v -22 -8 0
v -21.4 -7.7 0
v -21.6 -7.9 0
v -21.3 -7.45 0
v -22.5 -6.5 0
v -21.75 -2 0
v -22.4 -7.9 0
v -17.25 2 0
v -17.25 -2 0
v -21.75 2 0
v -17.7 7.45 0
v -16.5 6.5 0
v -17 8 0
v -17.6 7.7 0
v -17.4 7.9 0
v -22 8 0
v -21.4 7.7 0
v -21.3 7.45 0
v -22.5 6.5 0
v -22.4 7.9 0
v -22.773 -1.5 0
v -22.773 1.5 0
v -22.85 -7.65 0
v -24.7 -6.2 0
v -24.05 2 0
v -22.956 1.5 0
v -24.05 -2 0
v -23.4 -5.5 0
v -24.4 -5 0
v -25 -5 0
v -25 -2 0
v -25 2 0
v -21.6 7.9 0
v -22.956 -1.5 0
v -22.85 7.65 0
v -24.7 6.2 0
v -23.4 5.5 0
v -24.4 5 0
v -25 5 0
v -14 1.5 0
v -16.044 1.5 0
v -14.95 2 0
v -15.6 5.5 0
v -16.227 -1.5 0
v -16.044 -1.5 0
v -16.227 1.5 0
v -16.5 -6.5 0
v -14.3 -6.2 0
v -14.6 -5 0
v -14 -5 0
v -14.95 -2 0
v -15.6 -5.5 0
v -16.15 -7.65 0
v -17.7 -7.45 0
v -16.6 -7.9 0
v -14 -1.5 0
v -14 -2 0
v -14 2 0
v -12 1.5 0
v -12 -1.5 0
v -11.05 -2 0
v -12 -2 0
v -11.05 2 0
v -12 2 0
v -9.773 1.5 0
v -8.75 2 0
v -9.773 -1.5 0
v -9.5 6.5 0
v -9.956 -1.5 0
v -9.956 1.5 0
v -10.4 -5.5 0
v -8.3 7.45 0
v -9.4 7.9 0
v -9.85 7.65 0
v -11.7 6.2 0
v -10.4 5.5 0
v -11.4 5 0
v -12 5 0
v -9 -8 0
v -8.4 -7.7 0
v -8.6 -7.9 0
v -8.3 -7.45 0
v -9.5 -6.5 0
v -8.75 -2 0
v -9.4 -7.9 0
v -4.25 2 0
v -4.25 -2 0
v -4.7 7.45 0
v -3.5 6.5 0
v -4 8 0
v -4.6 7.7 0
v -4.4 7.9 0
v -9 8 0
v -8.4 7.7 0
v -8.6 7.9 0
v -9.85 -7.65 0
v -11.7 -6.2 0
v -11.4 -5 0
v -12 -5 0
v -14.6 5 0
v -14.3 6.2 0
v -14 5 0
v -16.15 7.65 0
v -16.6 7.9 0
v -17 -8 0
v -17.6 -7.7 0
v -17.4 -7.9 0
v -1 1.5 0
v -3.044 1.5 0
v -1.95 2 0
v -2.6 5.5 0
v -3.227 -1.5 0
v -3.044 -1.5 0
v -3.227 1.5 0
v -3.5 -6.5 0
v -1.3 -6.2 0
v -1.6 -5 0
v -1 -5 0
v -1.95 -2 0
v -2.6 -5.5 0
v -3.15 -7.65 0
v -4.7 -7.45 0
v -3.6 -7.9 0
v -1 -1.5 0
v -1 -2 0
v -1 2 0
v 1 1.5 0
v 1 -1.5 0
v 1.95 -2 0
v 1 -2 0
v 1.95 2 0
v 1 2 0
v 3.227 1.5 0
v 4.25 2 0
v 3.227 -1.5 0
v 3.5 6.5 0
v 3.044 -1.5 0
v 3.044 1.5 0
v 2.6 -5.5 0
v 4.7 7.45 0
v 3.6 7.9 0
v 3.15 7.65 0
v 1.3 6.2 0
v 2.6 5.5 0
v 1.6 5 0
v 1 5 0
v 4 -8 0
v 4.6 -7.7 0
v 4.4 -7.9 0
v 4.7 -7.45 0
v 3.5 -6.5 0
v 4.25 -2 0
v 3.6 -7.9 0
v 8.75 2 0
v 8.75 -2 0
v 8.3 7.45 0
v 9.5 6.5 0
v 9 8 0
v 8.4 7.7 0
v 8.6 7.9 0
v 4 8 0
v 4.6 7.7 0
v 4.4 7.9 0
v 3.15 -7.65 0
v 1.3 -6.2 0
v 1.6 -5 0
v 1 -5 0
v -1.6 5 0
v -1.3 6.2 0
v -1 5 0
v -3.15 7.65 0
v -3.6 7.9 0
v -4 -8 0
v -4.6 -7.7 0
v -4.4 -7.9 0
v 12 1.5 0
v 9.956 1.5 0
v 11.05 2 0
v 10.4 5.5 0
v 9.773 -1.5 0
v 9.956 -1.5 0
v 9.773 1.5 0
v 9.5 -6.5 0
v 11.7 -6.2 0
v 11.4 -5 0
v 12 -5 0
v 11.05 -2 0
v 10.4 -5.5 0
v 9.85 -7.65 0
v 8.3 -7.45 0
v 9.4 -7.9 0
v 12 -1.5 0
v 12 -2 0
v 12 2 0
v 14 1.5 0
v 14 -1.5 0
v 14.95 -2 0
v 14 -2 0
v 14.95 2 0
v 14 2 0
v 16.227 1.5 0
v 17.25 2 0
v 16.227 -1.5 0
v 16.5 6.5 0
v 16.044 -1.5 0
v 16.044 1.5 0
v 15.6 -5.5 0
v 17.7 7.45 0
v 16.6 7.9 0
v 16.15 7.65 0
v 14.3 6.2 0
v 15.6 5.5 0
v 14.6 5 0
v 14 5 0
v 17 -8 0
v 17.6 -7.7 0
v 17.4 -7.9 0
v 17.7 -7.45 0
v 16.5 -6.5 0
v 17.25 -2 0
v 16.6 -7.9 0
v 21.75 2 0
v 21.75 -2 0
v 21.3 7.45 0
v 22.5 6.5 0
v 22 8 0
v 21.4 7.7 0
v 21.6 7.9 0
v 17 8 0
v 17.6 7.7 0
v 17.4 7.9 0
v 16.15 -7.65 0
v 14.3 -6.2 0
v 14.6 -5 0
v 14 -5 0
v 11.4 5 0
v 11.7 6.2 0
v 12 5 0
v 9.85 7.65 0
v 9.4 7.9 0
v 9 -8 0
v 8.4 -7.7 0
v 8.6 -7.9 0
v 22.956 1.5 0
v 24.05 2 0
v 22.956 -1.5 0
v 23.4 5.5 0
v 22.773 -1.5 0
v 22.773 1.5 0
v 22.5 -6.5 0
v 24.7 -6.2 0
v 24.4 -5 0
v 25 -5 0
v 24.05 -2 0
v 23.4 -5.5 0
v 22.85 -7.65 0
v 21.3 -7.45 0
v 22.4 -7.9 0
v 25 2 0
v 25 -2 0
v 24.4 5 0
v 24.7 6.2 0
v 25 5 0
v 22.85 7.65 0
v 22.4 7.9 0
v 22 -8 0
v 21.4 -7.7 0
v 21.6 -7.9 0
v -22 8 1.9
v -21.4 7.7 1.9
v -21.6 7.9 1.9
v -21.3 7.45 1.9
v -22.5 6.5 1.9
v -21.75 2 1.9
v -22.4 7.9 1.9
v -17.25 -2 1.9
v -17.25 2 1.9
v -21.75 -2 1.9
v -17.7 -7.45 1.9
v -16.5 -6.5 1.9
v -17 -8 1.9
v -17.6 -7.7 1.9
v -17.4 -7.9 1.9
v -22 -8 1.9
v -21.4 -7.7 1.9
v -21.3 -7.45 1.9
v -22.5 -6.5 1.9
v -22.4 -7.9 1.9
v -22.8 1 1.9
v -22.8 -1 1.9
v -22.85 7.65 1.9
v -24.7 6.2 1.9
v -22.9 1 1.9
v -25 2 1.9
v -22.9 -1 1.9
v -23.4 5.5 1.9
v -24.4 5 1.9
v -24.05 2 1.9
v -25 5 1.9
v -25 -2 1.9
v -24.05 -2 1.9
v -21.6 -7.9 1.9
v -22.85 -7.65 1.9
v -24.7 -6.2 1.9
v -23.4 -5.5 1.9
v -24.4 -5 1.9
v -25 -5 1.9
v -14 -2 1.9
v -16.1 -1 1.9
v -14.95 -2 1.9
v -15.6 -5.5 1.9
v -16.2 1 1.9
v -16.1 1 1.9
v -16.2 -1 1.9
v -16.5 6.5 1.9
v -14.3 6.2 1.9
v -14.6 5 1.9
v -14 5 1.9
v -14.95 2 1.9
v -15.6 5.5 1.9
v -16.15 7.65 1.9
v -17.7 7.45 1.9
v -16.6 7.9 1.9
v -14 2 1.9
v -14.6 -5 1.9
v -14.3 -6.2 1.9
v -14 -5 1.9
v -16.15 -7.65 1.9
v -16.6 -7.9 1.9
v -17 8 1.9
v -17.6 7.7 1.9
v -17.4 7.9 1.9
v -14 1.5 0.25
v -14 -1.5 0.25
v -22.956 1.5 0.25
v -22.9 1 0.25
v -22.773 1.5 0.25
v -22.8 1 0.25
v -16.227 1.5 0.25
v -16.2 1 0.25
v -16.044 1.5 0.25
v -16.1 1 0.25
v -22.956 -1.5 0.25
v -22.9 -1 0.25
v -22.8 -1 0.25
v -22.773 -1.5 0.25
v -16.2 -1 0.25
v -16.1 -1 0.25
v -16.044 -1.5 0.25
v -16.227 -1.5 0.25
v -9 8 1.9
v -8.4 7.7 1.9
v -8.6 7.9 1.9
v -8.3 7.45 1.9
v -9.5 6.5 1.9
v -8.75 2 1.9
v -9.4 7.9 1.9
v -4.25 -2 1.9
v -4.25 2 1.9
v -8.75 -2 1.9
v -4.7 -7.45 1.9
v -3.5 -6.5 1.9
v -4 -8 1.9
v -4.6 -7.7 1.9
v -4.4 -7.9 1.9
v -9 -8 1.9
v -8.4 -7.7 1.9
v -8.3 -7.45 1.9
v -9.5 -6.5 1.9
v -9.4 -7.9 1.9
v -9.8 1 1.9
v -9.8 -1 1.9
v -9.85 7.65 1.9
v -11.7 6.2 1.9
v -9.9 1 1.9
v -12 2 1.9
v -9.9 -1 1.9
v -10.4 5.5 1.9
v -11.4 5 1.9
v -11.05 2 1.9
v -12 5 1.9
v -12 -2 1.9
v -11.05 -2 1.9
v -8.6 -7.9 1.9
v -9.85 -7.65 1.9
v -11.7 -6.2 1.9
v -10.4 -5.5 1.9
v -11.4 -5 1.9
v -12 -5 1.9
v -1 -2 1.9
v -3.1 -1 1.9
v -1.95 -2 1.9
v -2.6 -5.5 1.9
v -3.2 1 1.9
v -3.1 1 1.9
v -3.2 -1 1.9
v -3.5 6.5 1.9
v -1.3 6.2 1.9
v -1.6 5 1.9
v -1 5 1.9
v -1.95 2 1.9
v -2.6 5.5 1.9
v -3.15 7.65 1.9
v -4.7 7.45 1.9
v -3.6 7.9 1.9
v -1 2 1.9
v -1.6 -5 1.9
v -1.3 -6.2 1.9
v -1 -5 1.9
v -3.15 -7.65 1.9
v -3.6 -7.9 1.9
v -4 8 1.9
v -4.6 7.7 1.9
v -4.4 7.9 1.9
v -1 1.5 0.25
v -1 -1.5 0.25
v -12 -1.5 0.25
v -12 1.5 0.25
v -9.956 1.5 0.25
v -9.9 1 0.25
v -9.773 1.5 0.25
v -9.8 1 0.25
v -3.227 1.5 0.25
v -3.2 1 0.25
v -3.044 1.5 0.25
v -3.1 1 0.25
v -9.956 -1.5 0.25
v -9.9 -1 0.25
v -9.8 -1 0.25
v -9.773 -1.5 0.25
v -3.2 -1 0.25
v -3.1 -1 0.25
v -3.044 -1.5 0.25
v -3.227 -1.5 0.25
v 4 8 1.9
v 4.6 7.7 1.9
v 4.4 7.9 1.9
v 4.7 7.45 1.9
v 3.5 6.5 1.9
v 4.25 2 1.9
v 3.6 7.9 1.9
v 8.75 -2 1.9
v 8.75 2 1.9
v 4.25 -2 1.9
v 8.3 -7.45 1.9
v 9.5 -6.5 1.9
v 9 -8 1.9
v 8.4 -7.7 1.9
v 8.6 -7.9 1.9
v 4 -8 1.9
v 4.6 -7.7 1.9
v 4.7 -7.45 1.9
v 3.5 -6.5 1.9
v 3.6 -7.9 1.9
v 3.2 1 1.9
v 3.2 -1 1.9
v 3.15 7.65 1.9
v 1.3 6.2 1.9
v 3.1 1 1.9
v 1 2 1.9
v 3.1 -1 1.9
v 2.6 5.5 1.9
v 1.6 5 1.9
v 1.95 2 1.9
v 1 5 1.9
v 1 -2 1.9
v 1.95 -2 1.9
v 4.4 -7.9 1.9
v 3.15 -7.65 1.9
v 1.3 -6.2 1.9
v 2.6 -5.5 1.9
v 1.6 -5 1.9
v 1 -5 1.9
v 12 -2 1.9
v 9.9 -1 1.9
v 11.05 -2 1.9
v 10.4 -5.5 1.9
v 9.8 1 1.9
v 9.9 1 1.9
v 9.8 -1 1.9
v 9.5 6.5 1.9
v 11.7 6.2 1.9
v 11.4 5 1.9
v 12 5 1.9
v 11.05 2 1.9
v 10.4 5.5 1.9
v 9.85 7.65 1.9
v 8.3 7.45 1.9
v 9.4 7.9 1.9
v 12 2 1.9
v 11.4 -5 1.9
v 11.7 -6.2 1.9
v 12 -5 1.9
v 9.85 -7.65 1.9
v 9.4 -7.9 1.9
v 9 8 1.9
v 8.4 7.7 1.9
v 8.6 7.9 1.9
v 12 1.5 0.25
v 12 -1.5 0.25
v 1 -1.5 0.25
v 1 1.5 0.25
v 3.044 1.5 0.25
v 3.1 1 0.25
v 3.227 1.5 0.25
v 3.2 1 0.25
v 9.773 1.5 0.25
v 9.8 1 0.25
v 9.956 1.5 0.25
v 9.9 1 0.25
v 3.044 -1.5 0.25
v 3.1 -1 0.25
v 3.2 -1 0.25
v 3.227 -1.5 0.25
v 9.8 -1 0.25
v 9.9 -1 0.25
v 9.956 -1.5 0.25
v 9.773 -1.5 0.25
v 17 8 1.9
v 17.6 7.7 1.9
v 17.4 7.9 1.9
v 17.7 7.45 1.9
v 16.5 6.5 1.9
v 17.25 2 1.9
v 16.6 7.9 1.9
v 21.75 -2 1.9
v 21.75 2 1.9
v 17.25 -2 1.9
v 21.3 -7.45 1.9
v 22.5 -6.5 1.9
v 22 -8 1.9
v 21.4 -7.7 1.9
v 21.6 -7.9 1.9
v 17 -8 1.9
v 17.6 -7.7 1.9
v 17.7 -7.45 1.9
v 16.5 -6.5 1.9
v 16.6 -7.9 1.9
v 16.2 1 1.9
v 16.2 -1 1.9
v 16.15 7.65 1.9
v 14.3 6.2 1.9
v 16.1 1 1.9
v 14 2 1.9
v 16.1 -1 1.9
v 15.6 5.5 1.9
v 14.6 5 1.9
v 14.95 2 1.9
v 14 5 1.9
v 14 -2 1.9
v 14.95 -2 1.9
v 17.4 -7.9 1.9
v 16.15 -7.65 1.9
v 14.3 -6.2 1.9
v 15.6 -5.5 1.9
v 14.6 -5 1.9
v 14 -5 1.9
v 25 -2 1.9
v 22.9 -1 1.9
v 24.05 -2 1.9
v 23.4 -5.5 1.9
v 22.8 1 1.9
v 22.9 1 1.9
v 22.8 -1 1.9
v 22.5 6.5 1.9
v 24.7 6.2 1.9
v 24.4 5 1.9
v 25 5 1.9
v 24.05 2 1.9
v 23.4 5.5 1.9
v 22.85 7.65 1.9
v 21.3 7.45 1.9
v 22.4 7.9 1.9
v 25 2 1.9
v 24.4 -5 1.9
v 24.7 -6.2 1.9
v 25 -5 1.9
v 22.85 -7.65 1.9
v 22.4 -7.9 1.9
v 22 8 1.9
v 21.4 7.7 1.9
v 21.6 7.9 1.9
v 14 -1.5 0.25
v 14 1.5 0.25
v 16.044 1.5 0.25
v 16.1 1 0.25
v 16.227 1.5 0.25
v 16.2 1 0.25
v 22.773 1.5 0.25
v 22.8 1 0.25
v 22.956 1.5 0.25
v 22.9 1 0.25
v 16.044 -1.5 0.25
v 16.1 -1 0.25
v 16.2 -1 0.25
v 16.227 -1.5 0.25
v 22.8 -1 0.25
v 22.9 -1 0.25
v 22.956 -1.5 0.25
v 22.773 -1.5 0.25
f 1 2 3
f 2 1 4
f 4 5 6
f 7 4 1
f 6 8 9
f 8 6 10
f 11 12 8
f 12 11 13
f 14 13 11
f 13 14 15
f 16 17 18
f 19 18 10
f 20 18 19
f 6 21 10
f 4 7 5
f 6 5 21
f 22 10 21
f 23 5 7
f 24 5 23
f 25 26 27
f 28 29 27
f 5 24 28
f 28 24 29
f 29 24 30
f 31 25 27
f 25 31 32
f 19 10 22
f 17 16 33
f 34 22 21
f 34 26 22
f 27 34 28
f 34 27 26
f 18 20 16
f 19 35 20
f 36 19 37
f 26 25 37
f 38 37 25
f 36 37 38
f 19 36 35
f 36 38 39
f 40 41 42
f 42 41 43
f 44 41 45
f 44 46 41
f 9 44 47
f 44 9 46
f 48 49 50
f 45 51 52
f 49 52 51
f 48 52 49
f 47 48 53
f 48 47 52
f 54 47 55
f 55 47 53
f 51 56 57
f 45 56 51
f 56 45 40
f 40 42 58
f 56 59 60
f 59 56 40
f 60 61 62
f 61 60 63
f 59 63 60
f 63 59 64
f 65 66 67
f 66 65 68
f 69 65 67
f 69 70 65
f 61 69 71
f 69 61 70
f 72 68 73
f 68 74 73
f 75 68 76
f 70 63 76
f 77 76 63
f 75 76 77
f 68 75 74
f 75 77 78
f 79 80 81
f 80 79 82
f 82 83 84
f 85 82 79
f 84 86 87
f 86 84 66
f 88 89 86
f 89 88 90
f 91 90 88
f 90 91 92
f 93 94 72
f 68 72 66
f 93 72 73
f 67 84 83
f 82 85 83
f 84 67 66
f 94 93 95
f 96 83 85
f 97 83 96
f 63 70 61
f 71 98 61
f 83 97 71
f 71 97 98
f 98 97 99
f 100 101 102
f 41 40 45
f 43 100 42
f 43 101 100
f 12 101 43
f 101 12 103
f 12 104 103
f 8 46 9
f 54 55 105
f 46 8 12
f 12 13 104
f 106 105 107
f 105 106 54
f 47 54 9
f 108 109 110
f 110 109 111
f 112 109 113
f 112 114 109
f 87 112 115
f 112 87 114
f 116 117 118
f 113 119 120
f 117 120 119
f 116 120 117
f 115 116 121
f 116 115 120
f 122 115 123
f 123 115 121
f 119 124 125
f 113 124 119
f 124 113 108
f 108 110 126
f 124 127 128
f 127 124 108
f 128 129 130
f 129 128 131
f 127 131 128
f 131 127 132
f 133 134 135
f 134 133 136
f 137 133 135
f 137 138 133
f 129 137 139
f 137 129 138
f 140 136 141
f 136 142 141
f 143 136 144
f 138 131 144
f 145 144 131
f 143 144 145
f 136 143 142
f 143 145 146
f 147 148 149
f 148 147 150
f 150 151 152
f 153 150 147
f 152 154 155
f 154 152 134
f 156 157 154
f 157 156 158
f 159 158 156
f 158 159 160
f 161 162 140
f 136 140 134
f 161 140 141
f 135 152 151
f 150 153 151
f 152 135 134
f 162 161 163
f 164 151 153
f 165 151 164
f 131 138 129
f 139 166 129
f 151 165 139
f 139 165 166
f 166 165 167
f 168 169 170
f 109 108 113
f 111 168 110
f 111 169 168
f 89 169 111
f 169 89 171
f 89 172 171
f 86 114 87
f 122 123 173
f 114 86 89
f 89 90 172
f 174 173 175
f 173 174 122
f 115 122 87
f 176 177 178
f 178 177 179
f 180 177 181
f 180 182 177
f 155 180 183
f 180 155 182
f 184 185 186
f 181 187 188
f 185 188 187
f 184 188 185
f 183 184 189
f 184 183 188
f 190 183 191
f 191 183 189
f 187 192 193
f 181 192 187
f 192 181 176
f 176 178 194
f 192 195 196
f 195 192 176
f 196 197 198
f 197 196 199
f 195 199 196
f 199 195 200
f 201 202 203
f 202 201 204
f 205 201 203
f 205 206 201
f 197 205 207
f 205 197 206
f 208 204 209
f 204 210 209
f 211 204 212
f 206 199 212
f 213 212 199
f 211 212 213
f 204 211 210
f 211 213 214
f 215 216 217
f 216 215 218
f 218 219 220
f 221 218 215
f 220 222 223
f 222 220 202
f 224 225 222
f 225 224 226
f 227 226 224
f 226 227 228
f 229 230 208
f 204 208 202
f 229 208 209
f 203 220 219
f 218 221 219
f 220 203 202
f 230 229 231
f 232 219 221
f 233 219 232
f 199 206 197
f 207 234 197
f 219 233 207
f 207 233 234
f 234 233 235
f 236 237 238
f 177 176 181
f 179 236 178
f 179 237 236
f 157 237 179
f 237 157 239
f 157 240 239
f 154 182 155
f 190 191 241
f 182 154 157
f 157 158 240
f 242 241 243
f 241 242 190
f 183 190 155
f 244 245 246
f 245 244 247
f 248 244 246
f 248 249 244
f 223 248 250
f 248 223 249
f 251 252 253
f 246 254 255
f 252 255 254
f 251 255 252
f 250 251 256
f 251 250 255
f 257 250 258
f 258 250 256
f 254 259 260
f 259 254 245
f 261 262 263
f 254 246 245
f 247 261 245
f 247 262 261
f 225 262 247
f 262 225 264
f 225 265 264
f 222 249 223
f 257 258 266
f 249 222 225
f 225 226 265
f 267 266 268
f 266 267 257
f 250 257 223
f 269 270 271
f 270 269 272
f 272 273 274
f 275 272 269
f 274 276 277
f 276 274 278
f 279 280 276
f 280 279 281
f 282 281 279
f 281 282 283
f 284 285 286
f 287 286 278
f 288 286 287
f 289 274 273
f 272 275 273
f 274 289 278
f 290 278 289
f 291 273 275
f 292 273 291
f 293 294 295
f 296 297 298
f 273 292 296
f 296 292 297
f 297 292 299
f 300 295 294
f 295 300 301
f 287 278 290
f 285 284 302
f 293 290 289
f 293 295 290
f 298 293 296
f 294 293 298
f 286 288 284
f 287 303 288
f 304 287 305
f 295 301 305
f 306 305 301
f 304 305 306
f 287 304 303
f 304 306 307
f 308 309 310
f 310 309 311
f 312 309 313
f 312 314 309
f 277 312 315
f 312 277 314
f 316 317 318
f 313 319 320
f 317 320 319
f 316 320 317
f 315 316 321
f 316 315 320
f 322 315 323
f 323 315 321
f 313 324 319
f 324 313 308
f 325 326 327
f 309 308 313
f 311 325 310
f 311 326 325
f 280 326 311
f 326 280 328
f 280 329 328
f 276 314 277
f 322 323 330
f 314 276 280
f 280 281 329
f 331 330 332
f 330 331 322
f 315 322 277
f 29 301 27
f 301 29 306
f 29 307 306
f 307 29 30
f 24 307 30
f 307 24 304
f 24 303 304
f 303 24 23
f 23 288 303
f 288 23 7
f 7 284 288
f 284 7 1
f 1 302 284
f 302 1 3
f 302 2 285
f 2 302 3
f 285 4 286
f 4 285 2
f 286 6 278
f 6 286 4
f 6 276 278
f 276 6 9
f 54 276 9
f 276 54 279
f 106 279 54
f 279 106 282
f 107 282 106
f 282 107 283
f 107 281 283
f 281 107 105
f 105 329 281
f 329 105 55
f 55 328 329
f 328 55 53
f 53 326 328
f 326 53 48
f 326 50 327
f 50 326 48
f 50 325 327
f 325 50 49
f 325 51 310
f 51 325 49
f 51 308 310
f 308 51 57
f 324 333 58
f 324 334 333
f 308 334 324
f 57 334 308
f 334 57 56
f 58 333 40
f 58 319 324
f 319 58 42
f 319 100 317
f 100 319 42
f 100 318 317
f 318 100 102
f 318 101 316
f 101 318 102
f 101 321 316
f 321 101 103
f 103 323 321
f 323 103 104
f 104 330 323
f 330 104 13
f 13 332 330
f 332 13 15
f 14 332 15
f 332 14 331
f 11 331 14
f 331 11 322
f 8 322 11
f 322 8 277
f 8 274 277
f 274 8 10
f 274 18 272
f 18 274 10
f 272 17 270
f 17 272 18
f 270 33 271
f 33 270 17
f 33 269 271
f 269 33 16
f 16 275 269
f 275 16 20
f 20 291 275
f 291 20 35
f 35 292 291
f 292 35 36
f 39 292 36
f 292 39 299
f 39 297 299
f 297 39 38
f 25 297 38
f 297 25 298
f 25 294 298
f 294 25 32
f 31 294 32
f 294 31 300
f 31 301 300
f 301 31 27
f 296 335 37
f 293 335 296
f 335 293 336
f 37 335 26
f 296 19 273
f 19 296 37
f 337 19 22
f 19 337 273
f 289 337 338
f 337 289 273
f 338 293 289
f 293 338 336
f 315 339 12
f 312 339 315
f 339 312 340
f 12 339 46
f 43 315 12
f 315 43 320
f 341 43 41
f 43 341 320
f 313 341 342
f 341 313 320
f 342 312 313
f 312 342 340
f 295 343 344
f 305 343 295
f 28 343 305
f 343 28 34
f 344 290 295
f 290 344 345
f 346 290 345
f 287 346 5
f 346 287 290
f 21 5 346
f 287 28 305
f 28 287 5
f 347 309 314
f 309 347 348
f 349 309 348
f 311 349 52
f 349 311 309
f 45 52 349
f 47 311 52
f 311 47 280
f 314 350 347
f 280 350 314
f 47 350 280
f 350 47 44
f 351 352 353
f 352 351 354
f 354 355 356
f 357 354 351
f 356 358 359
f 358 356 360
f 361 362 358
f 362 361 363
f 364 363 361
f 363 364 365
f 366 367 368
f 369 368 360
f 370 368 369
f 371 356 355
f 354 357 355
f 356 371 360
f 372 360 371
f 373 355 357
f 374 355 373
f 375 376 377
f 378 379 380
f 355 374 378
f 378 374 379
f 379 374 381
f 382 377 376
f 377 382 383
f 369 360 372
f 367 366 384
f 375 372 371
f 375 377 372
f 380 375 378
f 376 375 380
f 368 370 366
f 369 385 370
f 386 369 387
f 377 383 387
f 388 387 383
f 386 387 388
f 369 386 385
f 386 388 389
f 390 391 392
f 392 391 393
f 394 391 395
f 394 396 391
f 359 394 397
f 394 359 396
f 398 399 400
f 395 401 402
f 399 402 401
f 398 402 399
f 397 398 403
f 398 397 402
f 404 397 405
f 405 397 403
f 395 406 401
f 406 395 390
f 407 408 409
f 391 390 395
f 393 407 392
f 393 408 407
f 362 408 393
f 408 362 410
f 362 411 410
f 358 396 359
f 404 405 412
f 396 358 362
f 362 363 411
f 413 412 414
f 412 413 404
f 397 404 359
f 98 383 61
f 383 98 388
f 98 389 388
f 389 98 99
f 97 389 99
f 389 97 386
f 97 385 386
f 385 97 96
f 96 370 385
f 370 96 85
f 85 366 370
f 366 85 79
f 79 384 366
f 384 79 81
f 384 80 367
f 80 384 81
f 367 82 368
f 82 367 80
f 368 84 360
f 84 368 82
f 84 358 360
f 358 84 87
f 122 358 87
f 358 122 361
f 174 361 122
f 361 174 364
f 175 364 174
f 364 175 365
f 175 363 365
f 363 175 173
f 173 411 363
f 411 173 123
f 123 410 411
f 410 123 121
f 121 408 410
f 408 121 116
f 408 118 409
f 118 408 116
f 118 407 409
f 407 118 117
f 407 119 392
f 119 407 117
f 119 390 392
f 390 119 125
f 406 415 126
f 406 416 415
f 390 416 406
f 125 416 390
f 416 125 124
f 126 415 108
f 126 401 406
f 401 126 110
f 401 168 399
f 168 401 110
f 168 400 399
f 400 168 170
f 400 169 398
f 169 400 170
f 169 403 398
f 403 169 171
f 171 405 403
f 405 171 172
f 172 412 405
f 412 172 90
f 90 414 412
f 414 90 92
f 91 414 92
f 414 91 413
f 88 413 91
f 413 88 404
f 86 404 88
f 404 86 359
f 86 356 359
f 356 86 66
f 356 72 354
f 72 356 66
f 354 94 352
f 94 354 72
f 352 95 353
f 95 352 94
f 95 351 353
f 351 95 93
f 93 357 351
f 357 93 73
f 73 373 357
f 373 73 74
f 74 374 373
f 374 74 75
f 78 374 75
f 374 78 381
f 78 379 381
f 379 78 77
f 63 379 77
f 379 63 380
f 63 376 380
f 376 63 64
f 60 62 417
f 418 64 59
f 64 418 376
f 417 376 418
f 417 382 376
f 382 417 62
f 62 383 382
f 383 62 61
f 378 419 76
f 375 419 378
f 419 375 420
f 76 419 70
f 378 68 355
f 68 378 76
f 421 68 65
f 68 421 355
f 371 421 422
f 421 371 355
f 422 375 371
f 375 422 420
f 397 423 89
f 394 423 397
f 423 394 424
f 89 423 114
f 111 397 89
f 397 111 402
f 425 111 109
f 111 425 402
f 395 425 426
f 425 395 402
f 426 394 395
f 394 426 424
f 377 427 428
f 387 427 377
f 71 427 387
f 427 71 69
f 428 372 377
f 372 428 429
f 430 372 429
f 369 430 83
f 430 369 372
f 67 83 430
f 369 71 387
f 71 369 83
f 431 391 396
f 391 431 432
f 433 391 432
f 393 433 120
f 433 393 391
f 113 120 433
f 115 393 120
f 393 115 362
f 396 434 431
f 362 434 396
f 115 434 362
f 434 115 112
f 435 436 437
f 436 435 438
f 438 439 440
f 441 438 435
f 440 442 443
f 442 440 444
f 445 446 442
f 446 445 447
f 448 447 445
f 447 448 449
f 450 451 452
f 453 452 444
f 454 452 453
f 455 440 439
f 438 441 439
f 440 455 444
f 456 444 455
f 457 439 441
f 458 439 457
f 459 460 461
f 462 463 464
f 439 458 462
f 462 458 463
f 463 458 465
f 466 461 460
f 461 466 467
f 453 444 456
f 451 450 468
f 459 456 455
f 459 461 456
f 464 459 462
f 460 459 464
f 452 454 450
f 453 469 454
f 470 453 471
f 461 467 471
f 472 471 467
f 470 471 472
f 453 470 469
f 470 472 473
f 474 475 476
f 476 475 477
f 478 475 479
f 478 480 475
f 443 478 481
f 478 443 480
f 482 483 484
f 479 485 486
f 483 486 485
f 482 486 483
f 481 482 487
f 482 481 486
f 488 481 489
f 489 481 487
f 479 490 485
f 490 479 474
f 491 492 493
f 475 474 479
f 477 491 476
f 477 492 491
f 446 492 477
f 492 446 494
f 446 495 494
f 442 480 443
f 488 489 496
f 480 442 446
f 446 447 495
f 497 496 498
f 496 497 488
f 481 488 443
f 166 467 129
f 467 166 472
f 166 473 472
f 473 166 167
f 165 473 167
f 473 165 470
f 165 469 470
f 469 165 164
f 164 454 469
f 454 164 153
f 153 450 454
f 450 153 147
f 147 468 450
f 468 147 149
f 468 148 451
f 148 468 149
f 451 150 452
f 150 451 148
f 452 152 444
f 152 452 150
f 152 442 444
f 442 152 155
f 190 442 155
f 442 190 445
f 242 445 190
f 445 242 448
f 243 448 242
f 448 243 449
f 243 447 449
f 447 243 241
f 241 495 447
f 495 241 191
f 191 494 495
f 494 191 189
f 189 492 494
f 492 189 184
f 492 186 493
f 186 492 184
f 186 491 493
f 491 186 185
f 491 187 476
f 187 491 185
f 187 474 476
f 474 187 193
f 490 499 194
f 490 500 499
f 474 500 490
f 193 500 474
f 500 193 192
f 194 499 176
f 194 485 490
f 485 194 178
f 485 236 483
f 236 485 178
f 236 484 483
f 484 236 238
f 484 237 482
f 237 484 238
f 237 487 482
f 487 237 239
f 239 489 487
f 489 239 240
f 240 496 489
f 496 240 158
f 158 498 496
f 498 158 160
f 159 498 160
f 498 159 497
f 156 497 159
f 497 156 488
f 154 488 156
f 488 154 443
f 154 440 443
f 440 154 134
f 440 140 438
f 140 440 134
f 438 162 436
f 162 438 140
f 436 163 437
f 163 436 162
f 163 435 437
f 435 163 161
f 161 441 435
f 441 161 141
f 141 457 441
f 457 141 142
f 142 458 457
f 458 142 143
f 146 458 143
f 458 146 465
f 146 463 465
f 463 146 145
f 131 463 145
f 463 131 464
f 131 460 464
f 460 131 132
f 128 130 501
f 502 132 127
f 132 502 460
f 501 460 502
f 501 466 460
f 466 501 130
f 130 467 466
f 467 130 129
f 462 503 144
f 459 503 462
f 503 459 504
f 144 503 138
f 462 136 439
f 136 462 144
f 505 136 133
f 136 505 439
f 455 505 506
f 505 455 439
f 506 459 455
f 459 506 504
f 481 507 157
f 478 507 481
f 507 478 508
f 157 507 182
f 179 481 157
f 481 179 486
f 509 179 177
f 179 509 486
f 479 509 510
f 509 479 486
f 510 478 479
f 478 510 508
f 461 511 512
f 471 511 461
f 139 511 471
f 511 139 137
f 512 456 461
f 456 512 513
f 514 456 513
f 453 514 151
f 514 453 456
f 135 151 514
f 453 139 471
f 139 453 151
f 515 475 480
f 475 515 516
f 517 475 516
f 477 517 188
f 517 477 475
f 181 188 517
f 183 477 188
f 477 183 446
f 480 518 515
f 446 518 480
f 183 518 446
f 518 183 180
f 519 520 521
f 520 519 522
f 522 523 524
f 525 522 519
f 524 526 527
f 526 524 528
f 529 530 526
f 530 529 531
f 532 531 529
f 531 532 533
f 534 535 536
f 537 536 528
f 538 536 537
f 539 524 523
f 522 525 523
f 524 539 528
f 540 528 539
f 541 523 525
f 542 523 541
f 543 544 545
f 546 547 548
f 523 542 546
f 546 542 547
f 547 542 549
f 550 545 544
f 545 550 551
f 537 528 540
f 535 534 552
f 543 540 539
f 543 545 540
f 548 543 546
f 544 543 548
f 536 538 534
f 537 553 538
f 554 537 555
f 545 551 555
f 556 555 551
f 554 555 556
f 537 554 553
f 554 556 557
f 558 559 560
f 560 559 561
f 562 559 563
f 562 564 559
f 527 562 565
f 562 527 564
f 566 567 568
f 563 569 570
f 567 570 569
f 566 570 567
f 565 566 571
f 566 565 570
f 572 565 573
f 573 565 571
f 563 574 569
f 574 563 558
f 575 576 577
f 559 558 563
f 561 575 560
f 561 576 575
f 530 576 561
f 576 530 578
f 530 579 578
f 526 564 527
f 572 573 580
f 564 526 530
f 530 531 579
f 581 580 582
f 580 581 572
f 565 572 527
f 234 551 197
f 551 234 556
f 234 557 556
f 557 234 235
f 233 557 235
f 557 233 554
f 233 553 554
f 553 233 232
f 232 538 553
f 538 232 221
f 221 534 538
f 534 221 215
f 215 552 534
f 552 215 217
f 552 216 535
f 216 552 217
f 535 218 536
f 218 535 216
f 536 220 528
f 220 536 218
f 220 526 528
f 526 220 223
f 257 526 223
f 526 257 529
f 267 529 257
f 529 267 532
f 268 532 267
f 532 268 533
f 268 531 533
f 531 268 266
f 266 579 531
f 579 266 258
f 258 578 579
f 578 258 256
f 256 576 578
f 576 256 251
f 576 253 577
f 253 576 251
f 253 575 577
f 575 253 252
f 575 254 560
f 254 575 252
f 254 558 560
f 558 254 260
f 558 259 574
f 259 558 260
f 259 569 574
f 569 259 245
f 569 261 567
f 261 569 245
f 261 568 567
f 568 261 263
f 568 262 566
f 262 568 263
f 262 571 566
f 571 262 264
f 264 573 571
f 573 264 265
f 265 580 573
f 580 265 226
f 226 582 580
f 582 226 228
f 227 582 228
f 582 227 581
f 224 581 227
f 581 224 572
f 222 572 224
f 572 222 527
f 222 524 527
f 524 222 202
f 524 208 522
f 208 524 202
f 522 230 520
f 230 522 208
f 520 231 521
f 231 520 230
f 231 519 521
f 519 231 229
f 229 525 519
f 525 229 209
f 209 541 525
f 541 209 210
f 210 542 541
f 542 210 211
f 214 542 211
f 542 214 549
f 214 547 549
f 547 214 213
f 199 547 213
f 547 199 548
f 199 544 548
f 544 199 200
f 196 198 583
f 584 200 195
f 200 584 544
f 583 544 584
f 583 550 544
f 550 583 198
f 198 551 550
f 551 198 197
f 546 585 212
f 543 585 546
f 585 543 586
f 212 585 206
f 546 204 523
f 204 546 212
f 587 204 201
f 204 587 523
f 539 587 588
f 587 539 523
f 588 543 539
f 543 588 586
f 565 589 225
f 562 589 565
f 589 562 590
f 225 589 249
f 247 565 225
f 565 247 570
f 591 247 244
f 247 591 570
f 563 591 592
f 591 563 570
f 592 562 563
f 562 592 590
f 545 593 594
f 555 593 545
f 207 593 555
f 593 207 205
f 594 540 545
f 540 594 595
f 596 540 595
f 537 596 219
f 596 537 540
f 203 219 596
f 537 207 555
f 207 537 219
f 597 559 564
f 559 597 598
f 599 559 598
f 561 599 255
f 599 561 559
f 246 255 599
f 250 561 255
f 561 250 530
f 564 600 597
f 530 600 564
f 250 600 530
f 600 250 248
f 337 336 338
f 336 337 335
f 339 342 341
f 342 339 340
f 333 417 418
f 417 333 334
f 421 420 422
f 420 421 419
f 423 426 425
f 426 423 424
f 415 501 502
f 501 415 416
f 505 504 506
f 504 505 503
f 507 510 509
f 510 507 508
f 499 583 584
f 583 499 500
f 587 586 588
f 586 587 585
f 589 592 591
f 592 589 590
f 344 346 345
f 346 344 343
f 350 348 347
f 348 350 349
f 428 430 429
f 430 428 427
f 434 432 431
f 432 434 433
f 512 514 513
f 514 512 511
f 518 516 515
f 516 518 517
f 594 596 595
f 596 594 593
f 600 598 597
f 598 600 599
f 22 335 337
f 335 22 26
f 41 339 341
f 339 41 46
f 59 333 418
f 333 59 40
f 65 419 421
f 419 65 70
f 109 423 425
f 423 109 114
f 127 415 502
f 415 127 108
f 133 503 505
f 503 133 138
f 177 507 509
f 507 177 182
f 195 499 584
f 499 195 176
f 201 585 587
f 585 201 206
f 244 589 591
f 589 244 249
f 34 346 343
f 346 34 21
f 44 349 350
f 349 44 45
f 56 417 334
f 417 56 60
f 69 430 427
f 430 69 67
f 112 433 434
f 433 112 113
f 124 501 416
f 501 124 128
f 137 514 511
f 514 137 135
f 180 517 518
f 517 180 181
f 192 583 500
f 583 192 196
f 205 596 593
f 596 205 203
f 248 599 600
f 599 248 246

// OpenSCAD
// file: ../../girl/girl_common.scad
// Copyright 2025 Natalie Baker // Apache v2 //

base_size  = 32;
wall_width =  9;

magnet_dia    = 6.2;
magnet_height = 2.8;

lock_height   = 1.9;
lock_depth    = 4.9;
lock_shoulder = 2.0;
lock_width    = 11;

grid_size   = base_size + 2*wall_width;
grid_diag   = sqrt(2*grid_size*grid_size);
grid_height = max(lock_height, magnet_height)+1.2;

frame_size = 2.4;

module mirror_copy(m) {
	mirror(m) children();
	children();	
}

module repeat(size, x, y, z, center) {
	off = center 
		? [(x-1)*size[0],(y-1)*size[1],(z-1)*size[2]]/2 
		: [0,0,0];

	for(i = [0 : x-1])
	for(j = [0 : y-1])
	for(k = [0 : z-1])
		translate([
			size[0]*i-off[0],
			size[1]*j-off[1],
			size[2]*k-off[2]
		]) children();
}
// file: ../../girl/girl_lock.scad
// Copyright 2025 Natalie Baker // Apache v2 //

include<girl_common.scad>;

girl_lock();

//color("blue")
//translate([0,0,-1]) 
//girl_slot();

module girl_lock(center=true) {
	$fn=12;
	linear_extrude(lock_height, center=center, convexity=2)
	mirror_copy([0,1])
	mirror_copy([1,0])
	_girl_lock_part();
}

module girl_slot(center=true) {
	$fn=12;
	linear_extrude(lock_height+0.4, center=center, convexity=2)
	mirror_copy([0,1])
	mirror_copy([1,0])
	_girl_slot_part();
}

module _girl_slot_part() {
	polygon([
		[           0,      0.00],
		[lock_width/2+0.30, 0.00],
		[lock_width/2+0.30, lock_shoulder+0.2],
		[lock_width/2-0.45, lock_shoulder+0.2],
		[lock_width/2-0.75, 2.80],
		[lock_width/2-0.55, lock_depth],
		[lock_width/2+0.50, lock_depth],
		[lock_width/2+0.50, 8.25],
		[lock_width/2-5.00, 8.25],
		[lock_width/2-4.70, 2.75],
		[lock_width/2-5.00, 2.30],
		[           0,      2.30],
	]);
}

module _girl_lock_part() {
	difference() {
		polygon([
			[           0,      0.00],
			[lock_width/2,      0.00],
			[lock_width/2,      lock_shoulder],
			[lock_width/2-0.95, lock_shoulder],
			[lock_width/2-0.60, lock_depth+0.1],
			[lock_width/2,      lock_depth+0.1],
			[lock_width/2-0.30, 6.20],
			[lock_width/2-2.15, 7.65],
			[lock_width/2-2.60, 7.90],
			[lock_width/2-3.00, 8.00],
			[lock_width/2-3.40, 7.90],
			[lock_width/2-3.60, 7.70],
			[lock_width/2-3.70, 7.45],
			[lock_width/2-3.25, 2.00],
			[           0,      2.00],
		]);
		polygon([
			[lock_width/2-2.10, 1.00],
			[lock_width/2-1.60, 5.50],
			[lock_width/2-2.50, 6.50],
			[lock_width/2-2.20, 1.00],
		]);
	}
}

module mirror_copy(m) {
	mirror(m) children();
	children();	
}
// main file
// Copyright 2025 Natalie Baker // Apache v2 //

use<../../girl/girl_lock.scad>;
include<../../girl/girl_common.scad>;

repeat([lock_width+2, 1, 1], 4, 1, 1, center = true)
girl_lock(false);

linear_extrude(0.25) 
square([lock_width*4+2*3, lock_shoulder+1], center=true);
